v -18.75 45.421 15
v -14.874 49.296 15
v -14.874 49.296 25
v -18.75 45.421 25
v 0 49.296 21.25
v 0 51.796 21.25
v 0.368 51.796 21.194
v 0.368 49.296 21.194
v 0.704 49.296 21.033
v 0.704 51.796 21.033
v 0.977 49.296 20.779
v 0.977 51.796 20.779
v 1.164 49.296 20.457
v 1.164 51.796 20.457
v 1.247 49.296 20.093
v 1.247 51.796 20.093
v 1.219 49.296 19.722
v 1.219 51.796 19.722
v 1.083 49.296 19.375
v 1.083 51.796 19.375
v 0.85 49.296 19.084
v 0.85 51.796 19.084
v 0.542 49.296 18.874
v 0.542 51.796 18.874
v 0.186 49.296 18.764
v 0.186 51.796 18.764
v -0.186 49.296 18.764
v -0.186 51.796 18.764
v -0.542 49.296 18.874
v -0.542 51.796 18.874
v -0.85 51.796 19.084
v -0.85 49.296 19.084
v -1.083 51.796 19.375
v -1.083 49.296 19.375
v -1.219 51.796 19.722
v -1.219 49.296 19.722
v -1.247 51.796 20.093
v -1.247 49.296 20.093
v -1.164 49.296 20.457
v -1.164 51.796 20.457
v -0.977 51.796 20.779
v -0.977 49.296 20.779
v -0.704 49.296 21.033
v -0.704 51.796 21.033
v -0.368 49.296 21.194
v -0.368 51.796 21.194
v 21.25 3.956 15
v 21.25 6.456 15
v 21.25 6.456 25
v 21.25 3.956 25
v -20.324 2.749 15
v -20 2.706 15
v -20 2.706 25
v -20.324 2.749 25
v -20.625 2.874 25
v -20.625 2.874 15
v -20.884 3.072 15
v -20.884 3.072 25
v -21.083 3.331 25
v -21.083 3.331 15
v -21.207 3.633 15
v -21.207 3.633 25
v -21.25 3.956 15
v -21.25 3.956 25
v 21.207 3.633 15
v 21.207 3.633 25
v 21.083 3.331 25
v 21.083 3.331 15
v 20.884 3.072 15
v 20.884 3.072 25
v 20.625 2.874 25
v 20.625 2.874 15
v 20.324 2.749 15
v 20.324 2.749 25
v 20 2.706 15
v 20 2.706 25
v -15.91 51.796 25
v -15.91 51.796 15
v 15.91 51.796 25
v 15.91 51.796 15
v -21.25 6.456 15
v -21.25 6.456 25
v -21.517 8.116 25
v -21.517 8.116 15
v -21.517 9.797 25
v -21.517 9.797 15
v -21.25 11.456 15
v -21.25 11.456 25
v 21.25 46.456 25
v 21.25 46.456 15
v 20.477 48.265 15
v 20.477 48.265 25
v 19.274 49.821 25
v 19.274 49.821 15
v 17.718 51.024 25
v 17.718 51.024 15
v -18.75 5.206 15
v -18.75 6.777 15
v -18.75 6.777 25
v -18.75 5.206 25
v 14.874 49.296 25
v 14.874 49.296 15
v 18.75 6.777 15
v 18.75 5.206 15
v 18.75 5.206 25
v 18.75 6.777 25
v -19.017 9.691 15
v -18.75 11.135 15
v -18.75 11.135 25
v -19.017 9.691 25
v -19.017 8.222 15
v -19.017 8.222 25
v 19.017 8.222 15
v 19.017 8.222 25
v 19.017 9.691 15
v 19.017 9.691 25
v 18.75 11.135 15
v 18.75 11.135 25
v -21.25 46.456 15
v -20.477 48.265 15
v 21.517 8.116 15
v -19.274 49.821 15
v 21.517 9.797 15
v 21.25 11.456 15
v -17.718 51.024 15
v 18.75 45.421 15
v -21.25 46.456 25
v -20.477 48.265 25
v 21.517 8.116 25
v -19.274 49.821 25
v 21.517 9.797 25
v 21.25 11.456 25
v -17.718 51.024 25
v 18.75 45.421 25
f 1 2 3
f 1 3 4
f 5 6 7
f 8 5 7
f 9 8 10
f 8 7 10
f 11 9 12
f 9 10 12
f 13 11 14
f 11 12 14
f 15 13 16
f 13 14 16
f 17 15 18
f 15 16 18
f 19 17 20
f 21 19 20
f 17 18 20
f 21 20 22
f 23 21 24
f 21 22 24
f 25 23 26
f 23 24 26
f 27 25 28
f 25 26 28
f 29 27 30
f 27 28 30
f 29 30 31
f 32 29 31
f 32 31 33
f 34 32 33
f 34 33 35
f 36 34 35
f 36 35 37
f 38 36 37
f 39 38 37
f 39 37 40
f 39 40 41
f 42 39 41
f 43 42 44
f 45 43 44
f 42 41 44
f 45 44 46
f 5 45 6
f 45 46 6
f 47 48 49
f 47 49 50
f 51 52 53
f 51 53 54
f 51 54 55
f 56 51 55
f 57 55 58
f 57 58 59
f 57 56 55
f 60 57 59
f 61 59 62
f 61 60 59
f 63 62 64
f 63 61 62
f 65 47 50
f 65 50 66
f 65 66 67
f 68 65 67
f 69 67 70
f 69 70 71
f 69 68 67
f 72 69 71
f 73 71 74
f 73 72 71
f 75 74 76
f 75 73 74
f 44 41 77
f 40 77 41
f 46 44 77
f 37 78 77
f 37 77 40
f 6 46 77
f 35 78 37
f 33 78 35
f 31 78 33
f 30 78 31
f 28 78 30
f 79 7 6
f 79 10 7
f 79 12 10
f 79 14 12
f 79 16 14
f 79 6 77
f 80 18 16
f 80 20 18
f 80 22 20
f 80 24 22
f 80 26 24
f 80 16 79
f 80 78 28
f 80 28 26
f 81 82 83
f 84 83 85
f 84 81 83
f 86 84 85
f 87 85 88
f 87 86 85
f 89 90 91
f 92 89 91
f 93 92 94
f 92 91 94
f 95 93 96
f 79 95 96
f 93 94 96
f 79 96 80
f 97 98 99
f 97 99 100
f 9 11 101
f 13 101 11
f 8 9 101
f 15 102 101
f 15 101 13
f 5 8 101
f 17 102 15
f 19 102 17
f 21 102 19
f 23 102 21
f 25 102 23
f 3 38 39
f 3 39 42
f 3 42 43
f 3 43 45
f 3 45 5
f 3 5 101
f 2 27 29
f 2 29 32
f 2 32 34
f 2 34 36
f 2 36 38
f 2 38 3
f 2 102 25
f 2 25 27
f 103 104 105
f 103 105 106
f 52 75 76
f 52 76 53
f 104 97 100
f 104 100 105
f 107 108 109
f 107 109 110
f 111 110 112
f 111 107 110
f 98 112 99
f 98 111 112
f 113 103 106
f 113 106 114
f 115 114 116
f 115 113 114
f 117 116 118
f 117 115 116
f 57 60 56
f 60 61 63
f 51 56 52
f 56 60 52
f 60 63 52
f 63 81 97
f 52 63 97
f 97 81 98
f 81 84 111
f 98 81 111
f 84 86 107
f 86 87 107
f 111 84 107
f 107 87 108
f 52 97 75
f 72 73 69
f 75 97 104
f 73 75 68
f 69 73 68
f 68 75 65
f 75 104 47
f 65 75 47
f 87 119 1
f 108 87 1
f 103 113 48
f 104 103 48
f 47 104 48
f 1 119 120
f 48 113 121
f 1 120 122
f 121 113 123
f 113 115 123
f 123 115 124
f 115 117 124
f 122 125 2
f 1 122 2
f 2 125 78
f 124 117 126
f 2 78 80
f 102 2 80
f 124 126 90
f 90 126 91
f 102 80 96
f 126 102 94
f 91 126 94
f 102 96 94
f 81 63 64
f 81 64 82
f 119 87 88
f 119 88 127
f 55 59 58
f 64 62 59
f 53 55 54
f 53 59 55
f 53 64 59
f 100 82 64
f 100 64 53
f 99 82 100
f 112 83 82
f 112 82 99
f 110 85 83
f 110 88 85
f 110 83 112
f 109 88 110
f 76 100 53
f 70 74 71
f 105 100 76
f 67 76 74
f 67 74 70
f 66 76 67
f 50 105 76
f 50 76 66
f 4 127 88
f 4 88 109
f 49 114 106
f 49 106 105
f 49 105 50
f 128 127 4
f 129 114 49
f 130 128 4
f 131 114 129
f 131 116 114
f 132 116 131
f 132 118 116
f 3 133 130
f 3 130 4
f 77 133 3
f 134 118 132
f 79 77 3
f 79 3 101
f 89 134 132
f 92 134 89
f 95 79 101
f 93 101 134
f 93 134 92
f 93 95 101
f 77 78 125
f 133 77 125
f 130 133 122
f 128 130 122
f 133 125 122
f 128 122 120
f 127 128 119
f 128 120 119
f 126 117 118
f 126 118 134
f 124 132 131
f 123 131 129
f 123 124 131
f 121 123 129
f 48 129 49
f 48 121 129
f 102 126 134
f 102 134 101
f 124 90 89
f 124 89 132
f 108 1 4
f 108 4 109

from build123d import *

# Parameters (mm, degrees)
BOSS_EXTRU_1_DEPTH      = 40
EPAISSIR2_DEPTH         = 40
EPAISSIR3_DEPTH         = 40
ESQUISSE11_R            = 5
ENL_V_MAT_EXTRU_1_DEPTH = 10
ECHELLE1_SCALE          = 0.25


# Read off the part's stored shape, not the designer's step: Epaissir2, Epaissir3
with BuildPart() as part:
    # Esquisse1 → Boss.-Extru.1 (new body)
    with BuildSketch(Plane.XY):
        with BuildLine():
            Line((-85, 105), (-63.639838362, 126.360161638))
            Line((-63.639838362, 126.360161638), (63.639838362, 126.360161638))
            Line((63.639838362, 126.360161638), (85, 105))
            Line((85, 105), (85, -35))
            ThreePointArc((85, -35), (86.201897264, -45), (85, -55))
            Line((85, -55), (85, -65))
            ThreePointArc((85, -65), (83.535533906, -68.535533906), (80, -70))
            Line((80, -70), (-80, -70))
            ThreePointArc((-80, -70), (-83.535533906, -68.535533906), (-85, -65))
            Line((-85, -65), (-85, -55))
            ThreePointArc((-85, -55), (-86.201897264, -45), (-85, -35))
            Line((-85, -35), (-85, 105))
        make_face()
        with BuildLine():
            Line((75, 100.857864376), (59.497702738, 116.360161638))
            Line((59.497702738, 116.360161638), (-59.497702738, 116.360161638))
            Line((-59.497702738, 116.360161638), (-75, 100.857864376))
            Line((-75, 100.857864376), (-75, -36.284378696))
            ThreePointArc((-75, -36.284378696), (-76.201897264, -45), (-75, -53.715621304))
            Line((-75, -53.715621304), (-75, -60))
            Line((-75, -60), (75, -60))
            Line((75, -60), (75, -53.715621304))
            ThreePointArc((75, -53.715621304), (76.201897264, -45), (75, -36.284378696))
            Line((75, -36.284378696), (75, 100.857864376))
        make_face(mode=Mode.SUBTRACT)
    extrude(amount=BOSS_EXTRU_1_DEPTH)

    # Epaissir2 outline → Epaissir2 (add)
    with BuildSketch(Plane.XY):
        with BuildLine():
            ThreePointArc((-63.639838362, 126.360161638), (-77.097387468, 118.457549106), (-85, 105))
            Line((-85, 105), (-63.639838362, 126.360161638))
        make_face()
    extrude(amount=EPAISSIR2_DEPTH)

    # Epaissir3 outline → Epaissir3 (add)
    with BuildSketch(Plane.XY):
        with BuildLine():
            ThreePointArc((85, 105), (77.097387468, 118.457549106), (63.639838362, 126.360161638))
            Line((63.639838362, 126.360161638), (85, 105))
        make_face()
    extrude(amount=EPAISSIR3_DEPTH)

    # Esquisse11 → Enlèv. mat.-Extru.1 (cut)
    with BuildSketch(Plane(origin=(0, 126.360161638, 0), x_dir=(1, 0, 0), z_dir=(0, 1, 0))):
        with Locations(Location((0, -20, 0), (0, 0, 270))):
            Circle(ESQUISSE11_R)
    extrude(amount=-ENL_V_MAT_EXTRU_1_DEPTH, mode=Mode.SUBTRACT)


with BuildPart() as part_1:
    # Echelle1: scaled about (0, 26.941606469, 20)
    add(part.part.scale(ECHELLE1_SCALE).moved(Location((0, 20.206204852, 15))))


solid = part_1.part
